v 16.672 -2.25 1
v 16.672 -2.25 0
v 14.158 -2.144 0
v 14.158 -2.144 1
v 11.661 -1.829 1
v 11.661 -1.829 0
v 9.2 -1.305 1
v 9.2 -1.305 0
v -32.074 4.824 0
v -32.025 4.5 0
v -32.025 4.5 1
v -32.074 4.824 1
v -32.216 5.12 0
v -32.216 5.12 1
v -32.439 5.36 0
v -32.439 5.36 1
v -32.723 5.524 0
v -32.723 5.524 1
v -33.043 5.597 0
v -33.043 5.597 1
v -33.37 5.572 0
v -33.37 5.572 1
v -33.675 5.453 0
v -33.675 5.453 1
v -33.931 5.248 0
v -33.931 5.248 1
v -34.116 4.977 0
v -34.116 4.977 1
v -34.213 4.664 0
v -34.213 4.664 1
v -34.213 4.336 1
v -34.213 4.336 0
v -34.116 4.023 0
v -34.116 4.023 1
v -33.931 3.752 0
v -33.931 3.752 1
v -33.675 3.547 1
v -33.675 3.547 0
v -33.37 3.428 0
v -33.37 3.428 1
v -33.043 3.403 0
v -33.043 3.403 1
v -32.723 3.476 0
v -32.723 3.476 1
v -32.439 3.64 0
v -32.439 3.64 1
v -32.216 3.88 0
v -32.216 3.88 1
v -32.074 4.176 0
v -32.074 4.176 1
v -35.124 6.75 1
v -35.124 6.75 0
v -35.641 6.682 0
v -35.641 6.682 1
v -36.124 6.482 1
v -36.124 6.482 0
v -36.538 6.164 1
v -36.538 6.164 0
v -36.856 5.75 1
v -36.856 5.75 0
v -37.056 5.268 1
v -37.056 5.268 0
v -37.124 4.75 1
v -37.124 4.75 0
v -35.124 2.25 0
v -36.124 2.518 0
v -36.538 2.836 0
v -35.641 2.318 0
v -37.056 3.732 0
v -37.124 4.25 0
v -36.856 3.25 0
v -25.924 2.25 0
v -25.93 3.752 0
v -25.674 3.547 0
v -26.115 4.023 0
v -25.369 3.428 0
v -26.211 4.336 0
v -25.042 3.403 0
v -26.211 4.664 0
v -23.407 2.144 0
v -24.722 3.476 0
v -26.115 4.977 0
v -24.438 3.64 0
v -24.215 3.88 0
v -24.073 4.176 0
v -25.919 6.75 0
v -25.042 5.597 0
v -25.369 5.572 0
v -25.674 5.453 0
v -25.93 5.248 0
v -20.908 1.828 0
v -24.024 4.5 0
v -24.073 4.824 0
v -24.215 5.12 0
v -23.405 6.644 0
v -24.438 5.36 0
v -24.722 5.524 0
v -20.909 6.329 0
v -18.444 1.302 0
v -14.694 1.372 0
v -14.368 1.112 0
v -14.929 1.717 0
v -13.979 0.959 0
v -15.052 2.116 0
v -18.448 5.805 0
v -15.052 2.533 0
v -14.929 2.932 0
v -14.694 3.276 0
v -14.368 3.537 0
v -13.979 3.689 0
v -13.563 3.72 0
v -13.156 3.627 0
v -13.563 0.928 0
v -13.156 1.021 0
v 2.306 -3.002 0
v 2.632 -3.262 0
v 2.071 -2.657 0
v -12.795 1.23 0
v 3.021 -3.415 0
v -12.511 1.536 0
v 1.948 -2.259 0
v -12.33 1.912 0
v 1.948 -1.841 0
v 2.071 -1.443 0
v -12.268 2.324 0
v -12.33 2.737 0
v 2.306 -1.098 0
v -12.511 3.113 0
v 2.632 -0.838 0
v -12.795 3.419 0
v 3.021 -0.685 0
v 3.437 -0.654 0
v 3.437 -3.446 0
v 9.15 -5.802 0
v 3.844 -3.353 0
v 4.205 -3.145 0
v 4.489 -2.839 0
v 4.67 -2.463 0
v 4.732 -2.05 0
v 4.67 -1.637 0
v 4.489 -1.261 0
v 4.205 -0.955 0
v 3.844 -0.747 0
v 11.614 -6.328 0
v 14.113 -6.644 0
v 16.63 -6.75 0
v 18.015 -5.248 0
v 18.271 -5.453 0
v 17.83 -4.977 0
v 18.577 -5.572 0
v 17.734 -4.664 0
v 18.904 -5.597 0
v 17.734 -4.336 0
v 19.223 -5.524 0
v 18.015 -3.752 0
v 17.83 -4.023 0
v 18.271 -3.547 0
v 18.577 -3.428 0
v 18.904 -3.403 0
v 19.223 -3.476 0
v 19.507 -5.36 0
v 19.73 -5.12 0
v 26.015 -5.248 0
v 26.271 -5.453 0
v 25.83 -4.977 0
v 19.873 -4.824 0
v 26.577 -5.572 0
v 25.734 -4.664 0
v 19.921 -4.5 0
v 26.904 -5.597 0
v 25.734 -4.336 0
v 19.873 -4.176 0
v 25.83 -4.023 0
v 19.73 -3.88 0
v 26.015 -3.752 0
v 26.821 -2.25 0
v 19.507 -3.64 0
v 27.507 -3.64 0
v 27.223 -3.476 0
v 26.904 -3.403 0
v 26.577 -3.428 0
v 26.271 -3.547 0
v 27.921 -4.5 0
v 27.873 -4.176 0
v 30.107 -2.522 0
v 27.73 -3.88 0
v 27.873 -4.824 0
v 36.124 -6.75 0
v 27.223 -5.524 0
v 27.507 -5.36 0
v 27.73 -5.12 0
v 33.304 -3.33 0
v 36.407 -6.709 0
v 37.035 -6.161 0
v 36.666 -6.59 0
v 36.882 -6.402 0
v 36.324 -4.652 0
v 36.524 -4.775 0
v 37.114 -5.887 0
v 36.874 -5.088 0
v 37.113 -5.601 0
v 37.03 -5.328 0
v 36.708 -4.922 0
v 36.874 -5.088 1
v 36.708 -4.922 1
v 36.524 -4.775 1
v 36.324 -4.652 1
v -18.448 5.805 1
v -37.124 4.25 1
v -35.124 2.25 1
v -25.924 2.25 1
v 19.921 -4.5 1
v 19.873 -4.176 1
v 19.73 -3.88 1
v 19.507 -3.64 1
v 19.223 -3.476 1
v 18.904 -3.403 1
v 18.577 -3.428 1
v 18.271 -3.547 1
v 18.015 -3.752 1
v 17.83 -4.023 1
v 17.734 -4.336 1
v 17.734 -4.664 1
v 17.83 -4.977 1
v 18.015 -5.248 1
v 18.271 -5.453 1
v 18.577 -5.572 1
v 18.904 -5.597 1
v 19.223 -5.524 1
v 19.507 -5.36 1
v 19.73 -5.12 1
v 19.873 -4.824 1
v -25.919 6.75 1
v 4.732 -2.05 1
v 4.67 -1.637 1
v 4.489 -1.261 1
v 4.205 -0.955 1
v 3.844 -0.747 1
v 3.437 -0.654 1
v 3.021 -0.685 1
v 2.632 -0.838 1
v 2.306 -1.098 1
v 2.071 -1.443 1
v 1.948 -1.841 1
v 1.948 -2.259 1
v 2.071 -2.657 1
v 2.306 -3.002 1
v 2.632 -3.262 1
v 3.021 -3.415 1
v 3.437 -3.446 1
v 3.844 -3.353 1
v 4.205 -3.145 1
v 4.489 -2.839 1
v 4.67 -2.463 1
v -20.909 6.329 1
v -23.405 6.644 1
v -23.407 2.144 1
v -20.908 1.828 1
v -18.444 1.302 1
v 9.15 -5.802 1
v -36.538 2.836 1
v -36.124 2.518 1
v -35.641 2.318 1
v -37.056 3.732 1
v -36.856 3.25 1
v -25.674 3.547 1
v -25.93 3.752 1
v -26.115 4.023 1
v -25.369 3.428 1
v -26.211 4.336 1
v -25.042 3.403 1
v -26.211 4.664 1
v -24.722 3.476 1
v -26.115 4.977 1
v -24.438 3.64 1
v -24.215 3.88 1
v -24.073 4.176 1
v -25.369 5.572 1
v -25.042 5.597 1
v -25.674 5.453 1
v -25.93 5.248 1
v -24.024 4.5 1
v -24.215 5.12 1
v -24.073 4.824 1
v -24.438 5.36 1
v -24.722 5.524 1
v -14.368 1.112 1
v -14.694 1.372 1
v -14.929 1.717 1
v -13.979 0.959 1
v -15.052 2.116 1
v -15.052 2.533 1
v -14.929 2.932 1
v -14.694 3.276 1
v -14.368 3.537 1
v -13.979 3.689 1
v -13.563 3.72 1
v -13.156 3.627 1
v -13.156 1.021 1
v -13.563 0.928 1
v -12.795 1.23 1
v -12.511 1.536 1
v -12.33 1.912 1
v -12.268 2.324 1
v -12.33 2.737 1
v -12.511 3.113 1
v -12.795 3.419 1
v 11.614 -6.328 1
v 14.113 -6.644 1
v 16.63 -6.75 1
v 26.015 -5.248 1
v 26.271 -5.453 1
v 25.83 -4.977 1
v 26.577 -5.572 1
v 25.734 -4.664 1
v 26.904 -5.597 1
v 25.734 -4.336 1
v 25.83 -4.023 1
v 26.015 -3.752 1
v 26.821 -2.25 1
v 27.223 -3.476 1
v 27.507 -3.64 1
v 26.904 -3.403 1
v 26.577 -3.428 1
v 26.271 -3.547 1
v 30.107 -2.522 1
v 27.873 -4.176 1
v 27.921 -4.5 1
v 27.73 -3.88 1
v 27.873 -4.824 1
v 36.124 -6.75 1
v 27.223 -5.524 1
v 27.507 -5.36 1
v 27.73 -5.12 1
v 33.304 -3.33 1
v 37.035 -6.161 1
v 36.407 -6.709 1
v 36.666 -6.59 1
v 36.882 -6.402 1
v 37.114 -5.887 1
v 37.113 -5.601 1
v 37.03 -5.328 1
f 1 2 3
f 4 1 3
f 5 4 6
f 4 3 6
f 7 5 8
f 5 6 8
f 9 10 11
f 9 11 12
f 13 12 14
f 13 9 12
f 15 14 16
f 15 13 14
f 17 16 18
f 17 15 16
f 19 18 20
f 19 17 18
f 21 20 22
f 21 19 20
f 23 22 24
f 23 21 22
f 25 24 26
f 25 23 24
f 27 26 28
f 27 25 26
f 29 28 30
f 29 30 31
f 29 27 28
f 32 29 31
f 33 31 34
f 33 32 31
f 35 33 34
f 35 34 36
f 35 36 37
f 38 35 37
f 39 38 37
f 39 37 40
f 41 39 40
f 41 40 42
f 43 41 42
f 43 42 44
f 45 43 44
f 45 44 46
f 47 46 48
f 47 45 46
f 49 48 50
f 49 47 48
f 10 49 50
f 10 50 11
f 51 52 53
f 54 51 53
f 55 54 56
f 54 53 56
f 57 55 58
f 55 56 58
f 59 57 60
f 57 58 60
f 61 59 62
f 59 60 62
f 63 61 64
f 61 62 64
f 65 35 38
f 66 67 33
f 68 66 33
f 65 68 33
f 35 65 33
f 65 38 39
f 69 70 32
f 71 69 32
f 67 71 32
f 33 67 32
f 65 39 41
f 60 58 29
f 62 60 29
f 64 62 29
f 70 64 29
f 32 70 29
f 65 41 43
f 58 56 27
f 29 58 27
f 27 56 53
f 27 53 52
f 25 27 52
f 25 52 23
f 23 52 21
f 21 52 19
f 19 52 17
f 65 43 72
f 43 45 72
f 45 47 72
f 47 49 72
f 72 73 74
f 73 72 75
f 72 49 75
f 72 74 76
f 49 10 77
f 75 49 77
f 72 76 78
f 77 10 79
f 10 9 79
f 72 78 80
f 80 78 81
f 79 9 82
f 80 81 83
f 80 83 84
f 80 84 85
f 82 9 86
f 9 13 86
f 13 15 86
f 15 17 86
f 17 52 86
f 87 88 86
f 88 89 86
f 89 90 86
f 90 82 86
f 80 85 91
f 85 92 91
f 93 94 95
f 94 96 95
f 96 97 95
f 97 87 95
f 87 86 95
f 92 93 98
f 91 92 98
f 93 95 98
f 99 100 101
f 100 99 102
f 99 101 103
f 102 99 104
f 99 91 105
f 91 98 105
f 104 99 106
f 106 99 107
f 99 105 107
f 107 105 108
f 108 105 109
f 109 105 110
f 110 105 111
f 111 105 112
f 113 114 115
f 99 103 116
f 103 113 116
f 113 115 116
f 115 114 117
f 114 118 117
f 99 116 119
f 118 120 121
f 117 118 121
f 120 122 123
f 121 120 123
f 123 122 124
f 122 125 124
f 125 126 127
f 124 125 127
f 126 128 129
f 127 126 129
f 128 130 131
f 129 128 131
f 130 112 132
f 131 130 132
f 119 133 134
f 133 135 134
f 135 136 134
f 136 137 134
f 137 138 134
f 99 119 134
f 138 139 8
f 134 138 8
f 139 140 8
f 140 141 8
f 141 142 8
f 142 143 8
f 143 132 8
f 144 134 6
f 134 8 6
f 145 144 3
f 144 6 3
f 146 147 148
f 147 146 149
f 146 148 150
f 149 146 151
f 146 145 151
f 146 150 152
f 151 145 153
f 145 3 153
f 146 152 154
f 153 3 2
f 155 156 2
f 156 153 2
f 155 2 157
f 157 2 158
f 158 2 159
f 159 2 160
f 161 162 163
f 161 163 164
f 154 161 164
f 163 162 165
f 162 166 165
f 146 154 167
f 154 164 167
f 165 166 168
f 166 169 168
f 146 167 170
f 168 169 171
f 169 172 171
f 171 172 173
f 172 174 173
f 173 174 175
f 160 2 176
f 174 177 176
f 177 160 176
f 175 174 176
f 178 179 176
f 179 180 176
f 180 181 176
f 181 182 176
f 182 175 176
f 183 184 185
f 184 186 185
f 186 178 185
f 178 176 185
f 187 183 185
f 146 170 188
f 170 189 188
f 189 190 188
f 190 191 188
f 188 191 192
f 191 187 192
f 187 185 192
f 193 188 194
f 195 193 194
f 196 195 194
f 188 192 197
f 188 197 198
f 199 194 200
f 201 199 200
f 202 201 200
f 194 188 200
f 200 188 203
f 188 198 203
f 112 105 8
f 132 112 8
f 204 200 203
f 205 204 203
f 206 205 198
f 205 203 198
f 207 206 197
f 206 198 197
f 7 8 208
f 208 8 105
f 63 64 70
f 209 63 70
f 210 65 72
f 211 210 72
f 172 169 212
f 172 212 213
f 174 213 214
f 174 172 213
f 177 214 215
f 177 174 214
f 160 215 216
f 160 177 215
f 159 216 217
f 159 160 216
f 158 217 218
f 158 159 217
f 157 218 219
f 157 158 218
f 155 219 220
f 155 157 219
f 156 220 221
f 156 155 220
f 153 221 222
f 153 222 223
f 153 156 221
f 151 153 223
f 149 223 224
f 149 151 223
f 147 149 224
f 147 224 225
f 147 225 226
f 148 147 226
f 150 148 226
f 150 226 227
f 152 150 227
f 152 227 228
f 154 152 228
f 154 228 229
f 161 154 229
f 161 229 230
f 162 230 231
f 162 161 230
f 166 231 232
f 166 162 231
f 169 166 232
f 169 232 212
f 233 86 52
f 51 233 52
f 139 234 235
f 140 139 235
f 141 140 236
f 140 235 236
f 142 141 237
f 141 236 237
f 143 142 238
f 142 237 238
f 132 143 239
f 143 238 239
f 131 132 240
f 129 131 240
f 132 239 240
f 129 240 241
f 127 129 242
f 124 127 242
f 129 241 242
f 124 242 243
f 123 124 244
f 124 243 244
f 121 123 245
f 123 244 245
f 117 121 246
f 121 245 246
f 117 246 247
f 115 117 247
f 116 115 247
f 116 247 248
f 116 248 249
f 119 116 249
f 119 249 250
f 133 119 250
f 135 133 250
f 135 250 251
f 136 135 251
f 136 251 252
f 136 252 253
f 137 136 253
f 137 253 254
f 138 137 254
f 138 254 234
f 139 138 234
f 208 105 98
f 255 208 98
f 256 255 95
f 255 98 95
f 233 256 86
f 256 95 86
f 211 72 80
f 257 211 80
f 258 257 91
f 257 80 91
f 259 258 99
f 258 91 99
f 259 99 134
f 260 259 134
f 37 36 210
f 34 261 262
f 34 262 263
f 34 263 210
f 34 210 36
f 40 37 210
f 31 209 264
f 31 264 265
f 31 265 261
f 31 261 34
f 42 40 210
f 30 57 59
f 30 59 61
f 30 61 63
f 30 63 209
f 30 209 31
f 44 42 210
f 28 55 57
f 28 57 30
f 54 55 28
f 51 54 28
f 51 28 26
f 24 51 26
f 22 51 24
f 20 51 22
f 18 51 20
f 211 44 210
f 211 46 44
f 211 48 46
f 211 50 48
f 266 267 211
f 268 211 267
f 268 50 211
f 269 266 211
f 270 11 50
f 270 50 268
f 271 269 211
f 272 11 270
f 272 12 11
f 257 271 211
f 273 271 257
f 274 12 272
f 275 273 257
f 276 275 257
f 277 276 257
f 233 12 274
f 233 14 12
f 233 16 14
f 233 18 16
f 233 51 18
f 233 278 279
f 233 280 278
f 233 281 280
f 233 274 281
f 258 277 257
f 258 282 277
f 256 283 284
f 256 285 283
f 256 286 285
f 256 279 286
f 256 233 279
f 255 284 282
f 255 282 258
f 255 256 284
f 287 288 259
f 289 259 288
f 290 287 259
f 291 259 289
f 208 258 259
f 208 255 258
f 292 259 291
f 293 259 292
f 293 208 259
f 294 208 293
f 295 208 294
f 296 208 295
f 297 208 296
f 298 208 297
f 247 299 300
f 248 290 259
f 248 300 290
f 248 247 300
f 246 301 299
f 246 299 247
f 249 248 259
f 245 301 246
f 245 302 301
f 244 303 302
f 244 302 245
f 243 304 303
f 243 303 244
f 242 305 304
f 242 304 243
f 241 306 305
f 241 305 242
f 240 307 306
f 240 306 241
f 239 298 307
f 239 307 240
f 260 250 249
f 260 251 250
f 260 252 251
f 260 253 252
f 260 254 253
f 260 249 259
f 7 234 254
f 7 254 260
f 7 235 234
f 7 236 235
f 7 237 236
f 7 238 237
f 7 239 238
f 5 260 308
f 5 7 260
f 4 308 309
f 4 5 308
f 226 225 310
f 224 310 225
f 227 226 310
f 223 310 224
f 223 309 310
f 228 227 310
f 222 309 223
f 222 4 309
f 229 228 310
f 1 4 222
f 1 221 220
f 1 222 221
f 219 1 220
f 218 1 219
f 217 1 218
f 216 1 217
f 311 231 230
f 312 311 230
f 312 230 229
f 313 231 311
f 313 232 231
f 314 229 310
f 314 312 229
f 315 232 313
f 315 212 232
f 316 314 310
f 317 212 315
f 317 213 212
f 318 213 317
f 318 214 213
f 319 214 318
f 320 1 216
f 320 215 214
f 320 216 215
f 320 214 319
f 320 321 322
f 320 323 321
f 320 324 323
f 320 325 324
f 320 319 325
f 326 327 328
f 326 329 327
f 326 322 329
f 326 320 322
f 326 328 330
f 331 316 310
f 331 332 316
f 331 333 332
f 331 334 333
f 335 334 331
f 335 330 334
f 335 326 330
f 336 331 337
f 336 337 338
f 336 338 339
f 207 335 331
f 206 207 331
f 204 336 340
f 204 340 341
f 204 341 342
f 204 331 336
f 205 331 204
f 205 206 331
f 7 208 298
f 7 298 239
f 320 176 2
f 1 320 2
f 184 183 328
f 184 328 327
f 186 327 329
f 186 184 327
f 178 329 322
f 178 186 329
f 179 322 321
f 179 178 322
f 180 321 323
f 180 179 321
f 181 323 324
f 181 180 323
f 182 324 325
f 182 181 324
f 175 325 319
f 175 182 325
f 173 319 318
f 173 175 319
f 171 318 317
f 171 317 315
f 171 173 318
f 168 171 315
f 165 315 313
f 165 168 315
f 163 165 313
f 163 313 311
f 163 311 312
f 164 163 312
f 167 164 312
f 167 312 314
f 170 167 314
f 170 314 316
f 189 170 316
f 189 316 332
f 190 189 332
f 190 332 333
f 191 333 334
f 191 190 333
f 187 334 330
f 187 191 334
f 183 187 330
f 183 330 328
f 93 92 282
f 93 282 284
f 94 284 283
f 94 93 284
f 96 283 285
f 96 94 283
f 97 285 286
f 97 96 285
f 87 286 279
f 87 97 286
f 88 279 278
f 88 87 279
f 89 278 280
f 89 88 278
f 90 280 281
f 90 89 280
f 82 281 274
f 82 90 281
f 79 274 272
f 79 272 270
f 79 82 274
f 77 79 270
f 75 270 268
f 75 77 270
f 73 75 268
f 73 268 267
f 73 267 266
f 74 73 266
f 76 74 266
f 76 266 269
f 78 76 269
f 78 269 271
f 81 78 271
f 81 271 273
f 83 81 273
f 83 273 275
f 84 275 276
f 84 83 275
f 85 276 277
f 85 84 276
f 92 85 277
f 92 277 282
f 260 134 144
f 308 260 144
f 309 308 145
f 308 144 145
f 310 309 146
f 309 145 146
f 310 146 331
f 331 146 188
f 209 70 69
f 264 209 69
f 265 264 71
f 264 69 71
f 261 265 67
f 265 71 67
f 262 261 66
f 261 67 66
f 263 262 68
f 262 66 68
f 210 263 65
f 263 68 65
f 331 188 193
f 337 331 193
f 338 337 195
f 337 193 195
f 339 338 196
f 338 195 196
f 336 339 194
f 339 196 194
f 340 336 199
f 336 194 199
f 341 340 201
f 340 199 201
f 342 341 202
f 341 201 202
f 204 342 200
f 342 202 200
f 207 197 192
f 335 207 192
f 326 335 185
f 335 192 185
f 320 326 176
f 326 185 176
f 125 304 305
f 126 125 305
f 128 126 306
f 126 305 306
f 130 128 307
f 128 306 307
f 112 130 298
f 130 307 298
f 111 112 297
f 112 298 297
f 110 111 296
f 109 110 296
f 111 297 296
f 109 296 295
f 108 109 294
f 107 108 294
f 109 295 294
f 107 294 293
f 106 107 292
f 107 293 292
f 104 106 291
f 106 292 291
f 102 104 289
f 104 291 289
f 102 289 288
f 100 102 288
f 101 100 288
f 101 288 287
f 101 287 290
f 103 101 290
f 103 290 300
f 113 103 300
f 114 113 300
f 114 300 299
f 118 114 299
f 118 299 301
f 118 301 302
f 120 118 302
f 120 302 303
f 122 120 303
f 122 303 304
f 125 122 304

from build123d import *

# Parameters (mm, degrees)
SKETCH_2_R          = 1.1
EXTRUDE_1_DEPTH     = 1
SKETCH_4_R          = 1.4
CUT_EXTRUDE_1_DEPTH = 38.745650692


with BuildPart() as part:
    # 草图2 → 凸台-拉伸1 (new body)
    with BuildSketch(Plane.XY):
        with BuildLine():
            Line((9.2004412, -1.304787978), (-18.44790974, 5.804787978))
            ThreePointArc((-18.44790974, 5.804787978), (-22.15374848, 6.512758939), (-25.919140934, 6.75))
            Line((-25.919140934, 6.75), (-35.12373427, 6.75))
            ThreePointArc((-35.12373427, 6.75), (-36.537947832, 6.164213562), (-37.12373427, 4.75))
            Line((-37.12373427, 4.75), (-37.12373427, 4.25))
            ThreePointArc((-37.12373427, 4.25), (-36.537947832, 2.835786438), (-35.12373427, 2.25))
            Line((-35.12373427, 2.25), (-25.92398706, 2.25))
            ThreePointArc((-25.92398706, 2.25), (-22.153862686, 2.012159905), (-18.443517429, 1.302410814))
            Line((-18.443517429, 1.302410814), (9.149963579, -5.802410814))
            ThreePointArc((9.149963579, -5.802410814), (12.860308836, -6.512159905), (16.63043321, -6.75))
            Line((16.63043321, -6.75), (36.12373427, -6.75))
            ThreePointArc((36.12373427, -6.75), (37.035192863, -6.161391824), (36.873667496, -5.088486466))
            ThreePointArc((36.873667496, -5.088486466), (36.618179656, -4.845779883), (36.32405992, -4.651681705))
            ThreePointArc((36.32405992, -4.651681705), (31.722166726, -2.859714212), (26.821471158, -2.25))
            Line((26.821471158, -2.25), (16.671672394, -2.25))
            ThreePointArc((16.671672394, -2.25), (12.90627994, -2.012758939), (9.2004412, -1.304787978))
        make_face()
        with Locations((26.821471158, -4.5)):
            Circle(SKETCH_2_R, mode=Mode.SUBTRACT)
        with Locations((18.821471158, -4.5)):
            Circle(SKETCH_2_R, mode=Mode.SUBTRACT)
        with Locations((-25.12373427, 4.5)):
            Circle(SKETCH_2_R, mode=Mode.SUBTRACT)
        with Locations((-33.125142276, 4.5)):
            Circle(SKETCH_2_R, mode=Mode.SUBTRACT)
    extrude(amount=EXTRUDE_1_DEPTH)

    # 草图4 → 切除-拉伸1 (cut, through all)
    with BuildSketch(Plane.XY.offset(1)):
        with Locations((-13.6677648, 2.324207374)):
            Circle(SKETCH_4_R)
        with Locations((3.3322352, -2.049984423)):
            Circle(SKETCH_4_R)
    extrude(amount=-CUT_EXTRUDE_1_DEPTH, mode=Mode.SUBTRACT)


solid = part.part
